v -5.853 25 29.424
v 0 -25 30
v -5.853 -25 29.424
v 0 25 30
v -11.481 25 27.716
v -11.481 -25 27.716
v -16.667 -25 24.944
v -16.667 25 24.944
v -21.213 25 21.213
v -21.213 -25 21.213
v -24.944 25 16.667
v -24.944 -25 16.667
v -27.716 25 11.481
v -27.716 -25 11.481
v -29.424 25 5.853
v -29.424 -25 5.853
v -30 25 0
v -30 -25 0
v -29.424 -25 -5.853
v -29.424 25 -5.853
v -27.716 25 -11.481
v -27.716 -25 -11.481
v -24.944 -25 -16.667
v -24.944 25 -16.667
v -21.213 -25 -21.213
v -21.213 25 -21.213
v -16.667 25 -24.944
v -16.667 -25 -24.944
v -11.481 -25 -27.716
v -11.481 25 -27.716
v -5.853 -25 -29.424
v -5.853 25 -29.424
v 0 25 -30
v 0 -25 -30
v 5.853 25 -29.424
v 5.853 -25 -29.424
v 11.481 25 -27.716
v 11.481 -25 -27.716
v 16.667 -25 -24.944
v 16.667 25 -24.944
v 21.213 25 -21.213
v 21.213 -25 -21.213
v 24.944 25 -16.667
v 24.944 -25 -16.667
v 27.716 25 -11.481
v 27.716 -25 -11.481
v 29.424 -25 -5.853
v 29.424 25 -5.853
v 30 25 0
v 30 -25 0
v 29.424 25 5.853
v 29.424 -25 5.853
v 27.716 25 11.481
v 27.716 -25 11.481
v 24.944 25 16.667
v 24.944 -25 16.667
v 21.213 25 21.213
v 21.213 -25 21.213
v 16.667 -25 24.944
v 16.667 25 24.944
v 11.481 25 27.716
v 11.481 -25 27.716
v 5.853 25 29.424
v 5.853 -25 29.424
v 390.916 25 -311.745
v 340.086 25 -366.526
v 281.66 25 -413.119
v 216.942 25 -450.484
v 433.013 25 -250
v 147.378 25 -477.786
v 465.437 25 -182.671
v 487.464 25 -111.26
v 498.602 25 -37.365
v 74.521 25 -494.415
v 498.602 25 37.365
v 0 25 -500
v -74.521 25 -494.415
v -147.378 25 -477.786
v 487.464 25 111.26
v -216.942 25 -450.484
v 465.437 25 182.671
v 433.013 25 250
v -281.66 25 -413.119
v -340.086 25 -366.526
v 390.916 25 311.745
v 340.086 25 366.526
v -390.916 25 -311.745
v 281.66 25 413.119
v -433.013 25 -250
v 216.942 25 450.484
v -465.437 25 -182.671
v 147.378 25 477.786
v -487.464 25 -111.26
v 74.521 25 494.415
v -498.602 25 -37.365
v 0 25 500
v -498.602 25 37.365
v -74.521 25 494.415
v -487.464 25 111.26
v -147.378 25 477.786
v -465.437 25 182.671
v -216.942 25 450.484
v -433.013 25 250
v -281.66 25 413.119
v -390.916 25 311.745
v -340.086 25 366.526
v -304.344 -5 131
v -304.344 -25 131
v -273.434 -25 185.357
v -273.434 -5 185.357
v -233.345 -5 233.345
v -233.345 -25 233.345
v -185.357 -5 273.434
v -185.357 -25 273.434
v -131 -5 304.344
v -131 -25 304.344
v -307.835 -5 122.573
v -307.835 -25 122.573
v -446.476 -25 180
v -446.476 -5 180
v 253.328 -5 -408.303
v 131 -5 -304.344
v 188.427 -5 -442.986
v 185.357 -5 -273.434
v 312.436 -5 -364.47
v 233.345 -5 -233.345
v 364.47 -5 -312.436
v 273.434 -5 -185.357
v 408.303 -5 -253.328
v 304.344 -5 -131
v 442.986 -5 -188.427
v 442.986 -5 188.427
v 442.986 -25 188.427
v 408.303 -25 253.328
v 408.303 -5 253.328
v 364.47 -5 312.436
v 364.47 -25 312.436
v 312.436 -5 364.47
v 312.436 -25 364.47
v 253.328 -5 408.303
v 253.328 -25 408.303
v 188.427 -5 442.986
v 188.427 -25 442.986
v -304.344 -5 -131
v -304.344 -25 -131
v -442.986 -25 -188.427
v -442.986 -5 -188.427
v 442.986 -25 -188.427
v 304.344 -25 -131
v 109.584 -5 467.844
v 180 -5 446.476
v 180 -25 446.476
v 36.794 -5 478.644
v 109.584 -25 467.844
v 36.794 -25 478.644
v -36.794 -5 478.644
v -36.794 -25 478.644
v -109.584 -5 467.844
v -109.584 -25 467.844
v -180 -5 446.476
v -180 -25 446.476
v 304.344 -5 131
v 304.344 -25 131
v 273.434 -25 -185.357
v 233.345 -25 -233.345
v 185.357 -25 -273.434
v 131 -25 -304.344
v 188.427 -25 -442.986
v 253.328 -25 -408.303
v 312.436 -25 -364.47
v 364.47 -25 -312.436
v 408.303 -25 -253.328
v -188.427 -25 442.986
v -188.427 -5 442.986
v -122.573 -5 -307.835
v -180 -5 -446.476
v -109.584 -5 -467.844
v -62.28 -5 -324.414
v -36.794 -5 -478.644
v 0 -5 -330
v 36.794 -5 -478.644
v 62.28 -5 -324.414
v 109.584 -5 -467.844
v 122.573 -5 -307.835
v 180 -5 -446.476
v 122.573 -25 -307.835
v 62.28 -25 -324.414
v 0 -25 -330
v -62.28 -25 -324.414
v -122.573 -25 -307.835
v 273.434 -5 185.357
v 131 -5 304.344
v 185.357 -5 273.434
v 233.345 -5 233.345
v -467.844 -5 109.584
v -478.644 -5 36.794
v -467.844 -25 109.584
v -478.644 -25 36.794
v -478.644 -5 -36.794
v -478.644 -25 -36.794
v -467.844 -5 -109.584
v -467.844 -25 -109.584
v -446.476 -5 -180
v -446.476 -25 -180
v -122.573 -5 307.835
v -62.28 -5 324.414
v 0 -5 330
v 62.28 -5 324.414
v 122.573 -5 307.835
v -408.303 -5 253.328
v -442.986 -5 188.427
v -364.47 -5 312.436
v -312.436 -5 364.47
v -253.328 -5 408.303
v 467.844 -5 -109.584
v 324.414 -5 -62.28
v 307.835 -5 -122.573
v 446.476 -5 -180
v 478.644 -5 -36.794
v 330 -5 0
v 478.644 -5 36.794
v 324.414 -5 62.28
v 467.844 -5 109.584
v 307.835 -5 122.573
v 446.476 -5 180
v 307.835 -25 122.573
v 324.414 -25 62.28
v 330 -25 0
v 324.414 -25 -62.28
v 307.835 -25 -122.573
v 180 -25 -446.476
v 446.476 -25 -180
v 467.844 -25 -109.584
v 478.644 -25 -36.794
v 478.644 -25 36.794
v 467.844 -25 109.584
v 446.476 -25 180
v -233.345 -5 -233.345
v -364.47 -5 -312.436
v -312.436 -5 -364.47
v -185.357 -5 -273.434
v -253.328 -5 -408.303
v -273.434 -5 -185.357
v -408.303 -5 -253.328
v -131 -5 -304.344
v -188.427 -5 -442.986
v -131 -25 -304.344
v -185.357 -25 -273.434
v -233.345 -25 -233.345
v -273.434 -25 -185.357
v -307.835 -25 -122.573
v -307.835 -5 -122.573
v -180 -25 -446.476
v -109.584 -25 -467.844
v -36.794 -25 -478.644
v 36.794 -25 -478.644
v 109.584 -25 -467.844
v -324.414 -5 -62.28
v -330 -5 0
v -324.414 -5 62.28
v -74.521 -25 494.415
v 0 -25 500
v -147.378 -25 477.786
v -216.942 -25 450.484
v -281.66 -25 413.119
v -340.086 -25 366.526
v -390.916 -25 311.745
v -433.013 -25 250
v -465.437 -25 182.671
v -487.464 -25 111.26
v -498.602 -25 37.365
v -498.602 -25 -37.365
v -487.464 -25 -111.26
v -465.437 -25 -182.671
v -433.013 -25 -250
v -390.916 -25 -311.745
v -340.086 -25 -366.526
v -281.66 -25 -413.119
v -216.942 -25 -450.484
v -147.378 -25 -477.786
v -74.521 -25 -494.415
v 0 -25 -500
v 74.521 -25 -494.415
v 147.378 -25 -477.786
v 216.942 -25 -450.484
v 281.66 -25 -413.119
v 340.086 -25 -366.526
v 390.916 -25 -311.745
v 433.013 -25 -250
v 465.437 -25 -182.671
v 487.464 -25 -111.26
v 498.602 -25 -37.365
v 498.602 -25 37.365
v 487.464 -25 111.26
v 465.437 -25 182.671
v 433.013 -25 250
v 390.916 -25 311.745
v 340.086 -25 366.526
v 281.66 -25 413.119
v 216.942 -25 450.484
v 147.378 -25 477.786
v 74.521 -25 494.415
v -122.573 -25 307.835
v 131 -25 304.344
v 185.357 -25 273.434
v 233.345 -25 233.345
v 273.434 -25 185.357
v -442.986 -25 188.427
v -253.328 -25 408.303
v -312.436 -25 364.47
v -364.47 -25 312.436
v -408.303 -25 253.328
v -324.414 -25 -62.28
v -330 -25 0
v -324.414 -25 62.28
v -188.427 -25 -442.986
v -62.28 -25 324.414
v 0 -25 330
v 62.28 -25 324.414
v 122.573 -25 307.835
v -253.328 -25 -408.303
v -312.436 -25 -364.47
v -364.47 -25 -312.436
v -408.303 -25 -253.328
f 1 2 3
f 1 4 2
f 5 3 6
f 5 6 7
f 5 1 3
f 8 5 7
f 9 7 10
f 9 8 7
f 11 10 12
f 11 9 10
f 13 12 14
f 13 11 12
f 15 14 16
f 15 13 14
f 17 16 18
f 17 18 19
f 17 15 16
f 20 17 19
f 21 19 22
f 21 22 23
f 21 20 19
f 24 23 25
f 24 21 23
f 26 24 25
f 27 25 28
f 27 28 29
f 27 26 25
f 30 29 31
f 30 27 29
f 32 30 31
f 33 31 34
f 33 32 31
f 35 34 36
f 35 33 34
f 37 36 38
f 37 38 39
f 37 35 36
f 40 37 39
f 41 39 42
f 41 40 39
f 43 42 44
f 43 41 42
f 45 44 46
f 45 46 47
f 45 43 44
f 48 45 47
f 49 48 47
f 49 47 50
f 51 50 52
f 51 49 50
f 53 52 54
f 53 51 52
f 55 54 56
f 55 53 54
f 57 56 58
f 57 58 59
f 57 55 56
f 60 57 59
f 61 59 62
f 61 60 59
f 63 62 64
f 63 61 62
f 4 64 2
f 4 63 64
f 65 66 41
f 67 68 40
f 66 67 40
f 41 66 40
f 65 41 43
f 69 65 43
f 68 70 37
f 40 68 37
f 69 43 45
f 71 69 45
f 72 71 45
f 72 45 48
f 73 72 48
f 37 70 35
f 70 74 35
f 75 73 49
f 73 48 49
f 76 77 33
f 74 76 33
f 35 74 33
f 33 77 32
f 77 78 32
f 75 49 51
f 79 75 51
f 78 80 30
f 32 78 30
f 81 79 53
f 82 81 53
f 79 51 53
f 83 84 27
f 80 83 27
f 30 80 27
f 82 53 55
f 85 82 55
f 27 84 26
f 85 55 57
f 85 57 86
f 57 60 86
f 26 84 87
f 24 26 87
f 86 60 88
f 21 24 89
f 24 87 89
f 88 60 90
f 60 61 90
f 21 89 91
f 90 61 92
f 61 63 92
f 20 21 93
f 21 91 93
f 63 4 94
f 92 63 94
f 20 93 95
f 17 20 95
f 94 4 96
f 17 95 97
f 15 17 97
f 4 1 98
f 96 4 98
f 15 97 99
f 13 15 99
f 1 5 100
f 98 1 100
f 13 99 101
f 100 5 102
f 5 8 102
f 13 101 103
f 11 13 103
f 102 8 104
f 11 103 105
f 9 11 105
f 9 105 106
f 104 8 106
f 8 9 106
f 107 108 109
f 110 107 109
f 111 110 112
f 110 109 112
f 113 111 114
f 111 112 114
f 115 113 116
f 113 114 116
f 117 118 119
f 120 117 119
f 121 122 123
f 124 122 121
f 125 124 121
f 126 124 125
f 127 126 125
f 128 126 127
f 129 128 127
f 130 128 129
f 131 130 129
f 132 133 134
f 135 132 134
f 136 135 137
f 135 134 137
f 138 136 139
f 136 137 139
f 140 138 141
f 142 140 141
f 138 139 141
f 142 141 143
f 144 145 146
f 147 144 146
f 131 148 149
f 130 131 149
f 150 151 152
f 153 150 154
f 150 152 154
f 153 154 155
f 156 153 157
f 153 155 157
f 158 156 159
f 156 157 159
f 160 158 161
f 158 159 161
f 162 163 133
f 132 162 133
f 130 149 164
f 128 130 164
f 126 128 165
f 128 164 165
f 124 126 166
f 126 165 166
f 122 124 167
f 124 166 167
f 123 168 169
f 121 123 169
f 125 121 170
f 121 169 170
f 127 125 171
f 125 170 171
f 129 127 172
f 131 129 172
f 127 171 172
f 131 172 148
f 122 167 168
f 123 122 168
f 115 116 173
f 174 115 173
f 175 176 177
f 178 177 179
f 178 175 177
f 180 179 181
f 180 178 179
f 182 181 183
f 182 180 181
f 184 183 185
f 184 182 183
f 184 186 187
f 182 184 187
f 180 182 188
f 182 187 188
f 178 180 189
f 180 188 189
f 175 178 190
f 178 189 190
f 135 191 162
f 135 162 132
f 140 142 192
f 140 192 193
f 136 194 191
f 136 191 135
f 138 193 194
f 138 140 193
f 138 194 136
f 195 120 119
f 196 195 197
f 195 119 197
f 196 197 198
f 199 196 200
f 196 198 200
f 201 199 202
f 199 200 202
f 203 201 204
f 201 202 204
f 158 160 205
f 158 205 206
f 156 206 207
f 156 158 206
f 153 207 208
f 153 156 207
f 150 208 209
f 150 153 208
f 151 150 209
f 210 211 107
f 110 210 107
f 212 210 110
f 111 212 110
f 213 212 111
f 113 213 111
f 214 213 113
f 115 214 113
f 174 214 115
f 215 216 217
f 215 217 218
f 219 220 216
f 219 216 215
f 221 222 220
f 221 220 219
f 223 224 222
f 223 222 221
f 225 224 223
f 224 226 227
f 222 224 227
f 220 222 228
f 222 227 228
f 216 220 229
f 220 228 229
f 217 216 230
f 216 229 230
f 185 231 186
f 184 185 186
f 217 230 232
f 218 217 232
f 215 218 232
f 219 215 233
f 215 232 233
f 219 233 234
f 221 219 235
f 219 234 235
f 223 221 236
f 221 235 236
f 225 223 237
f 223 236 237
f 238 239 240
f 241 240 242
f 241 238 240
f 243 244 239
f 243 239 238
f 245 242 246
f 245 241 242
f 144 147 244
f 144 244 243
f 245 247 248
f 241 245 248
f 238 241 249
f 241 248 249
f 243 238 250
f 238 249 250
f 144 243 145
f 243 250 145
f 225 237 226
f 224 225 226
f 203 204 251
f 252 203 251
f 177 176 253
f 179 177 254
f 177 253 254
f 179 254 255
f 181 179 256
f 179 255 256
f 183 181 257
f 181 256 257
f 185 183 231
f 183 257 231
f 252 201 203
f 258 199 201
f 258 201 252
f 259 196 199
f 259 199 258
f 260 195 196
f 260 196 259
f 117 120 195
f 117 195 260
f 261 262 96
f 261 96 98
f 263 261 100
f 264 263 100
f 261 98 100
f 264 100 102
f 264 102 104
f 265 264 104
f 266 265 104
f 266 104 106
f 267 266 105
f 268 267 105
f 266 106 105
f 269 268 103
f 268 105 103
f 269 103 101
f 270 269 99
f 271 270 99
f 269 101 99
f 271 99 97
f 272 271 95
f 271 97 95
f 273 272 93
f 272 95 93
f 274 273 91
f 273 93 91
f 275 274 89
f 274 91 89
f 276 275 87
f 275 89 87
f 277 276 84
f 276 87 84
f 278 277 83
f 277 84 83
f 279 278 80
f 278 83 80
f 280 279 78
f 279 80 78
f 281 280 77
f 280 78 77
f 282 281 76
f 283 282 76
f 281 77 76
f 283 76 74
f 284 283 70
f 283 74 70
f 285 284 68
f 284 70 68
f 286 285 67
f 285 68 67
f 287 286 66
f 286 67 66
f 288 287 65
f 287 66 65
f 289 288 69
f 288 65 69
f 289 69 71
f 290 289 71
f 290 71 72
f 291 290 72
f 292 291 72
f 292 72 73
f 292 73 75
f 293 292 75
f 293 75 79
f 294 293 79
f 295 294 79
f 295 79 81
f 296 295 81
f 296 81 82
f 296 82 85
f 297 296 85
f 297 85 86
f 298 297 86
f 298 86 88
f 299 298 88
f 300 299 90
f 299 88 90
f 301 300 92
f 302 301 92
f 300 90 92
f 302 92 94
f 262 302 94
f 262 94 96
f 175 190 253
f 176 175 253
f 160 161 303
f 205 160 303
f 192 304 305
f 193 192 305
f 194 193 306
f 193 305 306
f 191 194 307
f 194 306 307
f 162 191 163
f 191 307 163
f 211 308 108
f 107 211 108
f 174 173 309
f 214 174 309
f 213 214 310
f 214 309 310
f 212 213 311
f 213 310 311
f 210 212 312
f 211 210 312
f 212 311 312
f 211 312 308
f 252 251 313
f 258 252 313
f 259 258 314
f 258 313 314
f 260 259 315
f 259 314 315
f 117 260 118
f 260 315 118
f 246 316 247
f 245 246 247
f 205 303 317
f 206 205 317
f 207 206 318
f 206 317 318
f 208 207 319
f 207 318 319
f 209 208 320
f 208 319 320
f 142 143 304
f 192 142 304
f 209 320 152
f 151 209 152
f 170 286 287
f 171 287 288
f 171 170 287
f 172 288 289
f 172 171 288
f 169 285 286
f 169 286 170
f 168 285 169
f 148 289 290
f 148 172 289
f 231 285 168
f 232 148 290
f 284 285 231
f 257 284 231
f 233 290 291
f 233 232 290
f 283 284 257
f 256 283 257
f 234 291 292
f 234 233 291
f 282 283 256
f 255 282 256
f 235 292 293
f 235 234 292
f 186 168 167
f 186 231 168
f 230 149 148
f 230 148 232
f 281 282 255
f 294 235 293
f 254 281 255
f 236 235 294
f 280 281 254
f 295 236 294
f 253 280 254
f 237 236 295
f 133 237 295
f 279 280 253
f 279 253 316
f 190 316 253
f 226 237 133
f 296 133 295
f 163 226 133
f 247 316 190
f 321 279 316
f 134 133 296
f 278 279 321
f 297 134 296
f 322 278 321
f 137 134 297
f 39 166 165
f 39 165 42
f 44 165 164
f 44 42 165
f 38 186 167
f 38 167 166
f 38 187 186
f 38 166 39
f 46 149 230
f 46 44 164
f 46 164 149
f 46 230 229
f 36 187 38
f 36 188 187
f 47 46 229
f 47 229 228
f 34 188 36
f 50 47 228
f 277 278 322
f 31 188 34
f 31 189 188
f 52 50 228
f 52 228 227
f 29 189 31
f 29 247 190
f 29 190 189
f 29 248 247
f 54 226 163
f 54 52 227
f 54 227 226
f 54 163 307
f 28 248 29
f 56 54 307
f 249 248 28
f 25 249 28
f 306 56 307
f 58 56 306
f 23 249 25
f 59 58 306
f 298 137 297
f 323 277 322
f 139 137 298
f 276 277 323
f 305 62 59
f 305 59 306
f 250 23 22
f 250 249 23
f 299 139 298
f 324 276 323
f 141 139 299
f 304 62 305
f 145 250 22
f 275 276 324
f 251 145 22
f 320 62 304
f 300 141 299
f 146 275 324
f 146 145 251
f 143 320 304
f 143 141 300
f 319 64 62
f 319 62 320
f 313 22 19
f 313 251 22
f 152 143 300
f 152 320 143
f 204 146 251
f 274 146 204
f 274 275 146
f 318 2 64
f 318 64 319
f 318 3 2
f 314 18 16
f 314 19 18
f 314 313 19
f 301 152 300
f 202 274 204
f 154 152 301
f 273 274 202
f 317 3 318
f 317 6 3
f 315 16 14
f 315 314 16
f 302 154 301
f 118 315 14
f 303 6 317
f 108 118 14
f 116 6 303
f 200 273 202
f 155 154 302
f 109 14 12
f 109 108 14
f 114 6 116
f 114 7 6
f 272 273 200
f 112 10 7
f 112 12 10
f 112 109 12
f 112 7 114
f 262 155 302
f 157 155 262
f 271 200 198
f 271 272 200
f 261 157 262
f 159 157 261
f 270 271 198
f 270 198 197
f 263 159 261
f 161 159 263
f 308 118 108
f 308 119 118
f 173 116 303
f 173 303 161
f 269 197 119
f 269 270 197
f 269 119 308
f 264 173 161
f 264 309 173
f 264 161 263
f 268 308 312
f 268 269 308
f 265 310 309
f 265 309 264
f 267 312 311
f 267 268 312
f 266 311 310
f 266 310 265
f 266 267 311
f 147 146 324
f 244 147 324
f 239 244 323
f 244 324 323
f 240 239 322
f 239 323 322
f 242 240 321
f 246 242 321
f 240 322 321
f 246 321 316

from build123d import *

# Parameters (mm, degrees)
SKETCH1_W          = 470
SKETCH1_H          = 50
CUT_EXTRUDE1_DEPTH = 20


with BuildPart() as part:
    # Sketch1 → Revolve1 (revolve)
    with BuildSketch(Plane(origin=(0, 0, 0), x_dir=(0, 0, -1), z_dir=(1, 0, 0))):
        with Locations((-265, 0)):
            Rectangle(SKETCH1_W, SKETCH1_H)
    revolve(axis=Axis((0, 285.555555556, 0), (0, -1, 0)))

    # Sketch2 → Cut-Extrude1 (cut)
    with BuildSketch(Plane.XZ.offset(25)):
        with BuildLine():
            Line((-180, 446.476151588), (-122.573000413, 307.835110337))
            ThreePointArc((-122.573000413, 307.835110337), (0, 330), (122.573000413, 307.835110337))
            Line((122.573000413, 307.835110337), (180, 446.476151588))
            ThreePointArc((180, 446.476151588), (0, 480), (-180, 446.476151588))
        make_face()
        with BuildLine():
            Line((188.427093812, 442.985535039), (131.000094225, 304.344493789))
            ThreePointArc((131.000094225, 304.344493789), (233.345237792, 233.345237792), (304.344493789, 131.000094225))
            Line((304.344493789, 131.000094225), (442.985535039, 188.427093812))
            ThreePointArc((442.985535039, 188.427093812), (339.41125497, 339.41125497), (188.427093812, 442.985535039))
        make_face()
        with BuildLine():
            Line((446.476151588, 180), (307.835110337, 122.573000413))
            ThreePointArc((307.835110337, 122.573000413), (330, 0), (307.835110337, -122.573000413))
            Line((307.835110337, -122.573000413), (446.476151588, -180))
            ThreePointArc((446.476151588, -180), (480, 0), (446.476151588, 180))
        make_face()
        with BuildLine():
            Line((442.985535039, -188.427093812), (304.344493789, -131.000094225))
            ThreePointArc((304.344493789, -131.000094225), (233.345237792, -233.345237792), (131.000094225, -304.344493789))
            Line((131.000094225, -304.344493789), (188.427093812, -442.985535039))
            ThreePointArc((188.427093812, -442.985535039), (339.41125497, -339.41125497), (442.985535039, -188.427093812))
        make_face()
        with BuildLine():
            Line((180, -446.476151588), (122.573000413, -307.835110337))
            ThreePointArc((122.573000413, -307.835110337), (0, -330), (-122.573000413, -307.835110337))
            Line((-122.573000413, -307.835110337), (-180, -446.476151588))
            ThreePointArc((-180, -446.476151588), (0, -480), (180, -446.476151588))
        make_face()
        with BuildLine():
            Line((-188.427093812, -442.985535039), (-131.000094225, -304.344493789))
            ThreePointArc((-131.000094225, -304.344493789), (-233.345237792, -233.345237792), (-304.344493789, -131.000094225))
            Line((-304.344493789, -131.000094225), (-442.985535039, -188.427093812))
            ThreePointArc((-442.985535039, -188.427093812), (-339.41125497, -339.41125497), (-188.427093812, -442.985535039))
        make_face()
        with BuildLine():
            Line((-446.476151588, -180), (-307.835110337, -122.573000413))
            ThreePointArc((-307.835110337, -122.573000413), (-330, 0), (-307.835110337, 122.573000413))
            Line((-307.835110337, 122.573000413), (-446.476151588, 180))
            ThreePointArc((-446.476151588, 180), (-480, 0), (-446.476151588, -180))
        make_face()
        with BuildLine():
            Line((-442.985535039, 188.427093812), (-304.344493789, 131.000094225))
            ThreePointArc((-304.344493789, 131.000094225), (-233.345237792, 233.345237792), (-131.000094225, 304.344493789))
            Line((-131.000094225, 304.344493789), (-188.427093812, 442.985535039))
            ThreePointArc((-188.427093812, 442.985535039), (-339.41125497, 339.41125497), (-442.985535039, 188.427093812))
        make_face()
    extrude(amount=-CUT_EXTRUDE1_DEPTH, mode=Mode.SUBTRACT)


solid = part.part
